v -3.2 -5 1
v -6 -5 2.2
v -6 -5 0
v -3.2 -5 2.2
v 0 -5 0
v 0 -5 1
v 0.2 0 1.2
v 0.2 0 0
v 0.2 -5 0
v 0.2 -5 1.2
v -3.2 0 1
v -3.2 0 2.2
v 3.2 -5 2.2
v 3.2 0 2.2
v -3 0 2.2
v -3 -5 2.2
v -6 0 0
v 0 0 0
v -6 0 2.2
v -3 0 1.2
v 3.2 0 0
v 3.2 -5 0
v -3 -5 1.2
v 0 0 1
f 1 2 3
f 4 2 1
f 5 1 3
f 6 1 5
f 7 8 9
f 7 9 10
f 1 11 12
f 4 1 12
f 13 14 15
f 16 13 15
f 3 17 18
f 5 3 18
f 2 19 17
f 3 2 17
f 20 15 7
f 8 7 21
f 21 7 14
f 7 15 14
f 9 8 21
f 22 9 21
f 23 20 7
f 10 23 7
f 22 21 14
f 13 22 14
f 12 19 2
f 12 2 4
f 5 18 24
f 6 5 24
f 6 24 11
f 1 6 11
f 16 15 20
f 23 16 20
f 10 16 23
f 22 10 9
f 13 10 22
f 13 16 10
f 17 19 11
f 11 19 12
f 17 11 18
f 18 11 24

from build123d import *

# Parameters (mm, degrees)
F0_W     = 3
F0_H     = 1.2
F0_W_2   = 2.8
F1_DEPTH = 5


with BuildPart() as f1:
    # F0 (on Front) → F1 (new body)
    with BuildSketch(Plane.XZ):
        Polygon((-6, 0), (0, 0), (0, 1), (-3.2, 1), (-6, 1), align=None)
        with Locations((1.7, 0.6)):
            Rectangle(F0_W, F0_H)
        Polygon((3.2, 2.2), (-3, 2.2), (-3, 1.2), (0.2, 1.2), (3.2, 1.2), align=None)
        with Locations((-4.6, 1.6)):
            Rectangle(F0_W_2, F0_H)
    extrude(amount=F1_DEPTH)


solid = f1.part
